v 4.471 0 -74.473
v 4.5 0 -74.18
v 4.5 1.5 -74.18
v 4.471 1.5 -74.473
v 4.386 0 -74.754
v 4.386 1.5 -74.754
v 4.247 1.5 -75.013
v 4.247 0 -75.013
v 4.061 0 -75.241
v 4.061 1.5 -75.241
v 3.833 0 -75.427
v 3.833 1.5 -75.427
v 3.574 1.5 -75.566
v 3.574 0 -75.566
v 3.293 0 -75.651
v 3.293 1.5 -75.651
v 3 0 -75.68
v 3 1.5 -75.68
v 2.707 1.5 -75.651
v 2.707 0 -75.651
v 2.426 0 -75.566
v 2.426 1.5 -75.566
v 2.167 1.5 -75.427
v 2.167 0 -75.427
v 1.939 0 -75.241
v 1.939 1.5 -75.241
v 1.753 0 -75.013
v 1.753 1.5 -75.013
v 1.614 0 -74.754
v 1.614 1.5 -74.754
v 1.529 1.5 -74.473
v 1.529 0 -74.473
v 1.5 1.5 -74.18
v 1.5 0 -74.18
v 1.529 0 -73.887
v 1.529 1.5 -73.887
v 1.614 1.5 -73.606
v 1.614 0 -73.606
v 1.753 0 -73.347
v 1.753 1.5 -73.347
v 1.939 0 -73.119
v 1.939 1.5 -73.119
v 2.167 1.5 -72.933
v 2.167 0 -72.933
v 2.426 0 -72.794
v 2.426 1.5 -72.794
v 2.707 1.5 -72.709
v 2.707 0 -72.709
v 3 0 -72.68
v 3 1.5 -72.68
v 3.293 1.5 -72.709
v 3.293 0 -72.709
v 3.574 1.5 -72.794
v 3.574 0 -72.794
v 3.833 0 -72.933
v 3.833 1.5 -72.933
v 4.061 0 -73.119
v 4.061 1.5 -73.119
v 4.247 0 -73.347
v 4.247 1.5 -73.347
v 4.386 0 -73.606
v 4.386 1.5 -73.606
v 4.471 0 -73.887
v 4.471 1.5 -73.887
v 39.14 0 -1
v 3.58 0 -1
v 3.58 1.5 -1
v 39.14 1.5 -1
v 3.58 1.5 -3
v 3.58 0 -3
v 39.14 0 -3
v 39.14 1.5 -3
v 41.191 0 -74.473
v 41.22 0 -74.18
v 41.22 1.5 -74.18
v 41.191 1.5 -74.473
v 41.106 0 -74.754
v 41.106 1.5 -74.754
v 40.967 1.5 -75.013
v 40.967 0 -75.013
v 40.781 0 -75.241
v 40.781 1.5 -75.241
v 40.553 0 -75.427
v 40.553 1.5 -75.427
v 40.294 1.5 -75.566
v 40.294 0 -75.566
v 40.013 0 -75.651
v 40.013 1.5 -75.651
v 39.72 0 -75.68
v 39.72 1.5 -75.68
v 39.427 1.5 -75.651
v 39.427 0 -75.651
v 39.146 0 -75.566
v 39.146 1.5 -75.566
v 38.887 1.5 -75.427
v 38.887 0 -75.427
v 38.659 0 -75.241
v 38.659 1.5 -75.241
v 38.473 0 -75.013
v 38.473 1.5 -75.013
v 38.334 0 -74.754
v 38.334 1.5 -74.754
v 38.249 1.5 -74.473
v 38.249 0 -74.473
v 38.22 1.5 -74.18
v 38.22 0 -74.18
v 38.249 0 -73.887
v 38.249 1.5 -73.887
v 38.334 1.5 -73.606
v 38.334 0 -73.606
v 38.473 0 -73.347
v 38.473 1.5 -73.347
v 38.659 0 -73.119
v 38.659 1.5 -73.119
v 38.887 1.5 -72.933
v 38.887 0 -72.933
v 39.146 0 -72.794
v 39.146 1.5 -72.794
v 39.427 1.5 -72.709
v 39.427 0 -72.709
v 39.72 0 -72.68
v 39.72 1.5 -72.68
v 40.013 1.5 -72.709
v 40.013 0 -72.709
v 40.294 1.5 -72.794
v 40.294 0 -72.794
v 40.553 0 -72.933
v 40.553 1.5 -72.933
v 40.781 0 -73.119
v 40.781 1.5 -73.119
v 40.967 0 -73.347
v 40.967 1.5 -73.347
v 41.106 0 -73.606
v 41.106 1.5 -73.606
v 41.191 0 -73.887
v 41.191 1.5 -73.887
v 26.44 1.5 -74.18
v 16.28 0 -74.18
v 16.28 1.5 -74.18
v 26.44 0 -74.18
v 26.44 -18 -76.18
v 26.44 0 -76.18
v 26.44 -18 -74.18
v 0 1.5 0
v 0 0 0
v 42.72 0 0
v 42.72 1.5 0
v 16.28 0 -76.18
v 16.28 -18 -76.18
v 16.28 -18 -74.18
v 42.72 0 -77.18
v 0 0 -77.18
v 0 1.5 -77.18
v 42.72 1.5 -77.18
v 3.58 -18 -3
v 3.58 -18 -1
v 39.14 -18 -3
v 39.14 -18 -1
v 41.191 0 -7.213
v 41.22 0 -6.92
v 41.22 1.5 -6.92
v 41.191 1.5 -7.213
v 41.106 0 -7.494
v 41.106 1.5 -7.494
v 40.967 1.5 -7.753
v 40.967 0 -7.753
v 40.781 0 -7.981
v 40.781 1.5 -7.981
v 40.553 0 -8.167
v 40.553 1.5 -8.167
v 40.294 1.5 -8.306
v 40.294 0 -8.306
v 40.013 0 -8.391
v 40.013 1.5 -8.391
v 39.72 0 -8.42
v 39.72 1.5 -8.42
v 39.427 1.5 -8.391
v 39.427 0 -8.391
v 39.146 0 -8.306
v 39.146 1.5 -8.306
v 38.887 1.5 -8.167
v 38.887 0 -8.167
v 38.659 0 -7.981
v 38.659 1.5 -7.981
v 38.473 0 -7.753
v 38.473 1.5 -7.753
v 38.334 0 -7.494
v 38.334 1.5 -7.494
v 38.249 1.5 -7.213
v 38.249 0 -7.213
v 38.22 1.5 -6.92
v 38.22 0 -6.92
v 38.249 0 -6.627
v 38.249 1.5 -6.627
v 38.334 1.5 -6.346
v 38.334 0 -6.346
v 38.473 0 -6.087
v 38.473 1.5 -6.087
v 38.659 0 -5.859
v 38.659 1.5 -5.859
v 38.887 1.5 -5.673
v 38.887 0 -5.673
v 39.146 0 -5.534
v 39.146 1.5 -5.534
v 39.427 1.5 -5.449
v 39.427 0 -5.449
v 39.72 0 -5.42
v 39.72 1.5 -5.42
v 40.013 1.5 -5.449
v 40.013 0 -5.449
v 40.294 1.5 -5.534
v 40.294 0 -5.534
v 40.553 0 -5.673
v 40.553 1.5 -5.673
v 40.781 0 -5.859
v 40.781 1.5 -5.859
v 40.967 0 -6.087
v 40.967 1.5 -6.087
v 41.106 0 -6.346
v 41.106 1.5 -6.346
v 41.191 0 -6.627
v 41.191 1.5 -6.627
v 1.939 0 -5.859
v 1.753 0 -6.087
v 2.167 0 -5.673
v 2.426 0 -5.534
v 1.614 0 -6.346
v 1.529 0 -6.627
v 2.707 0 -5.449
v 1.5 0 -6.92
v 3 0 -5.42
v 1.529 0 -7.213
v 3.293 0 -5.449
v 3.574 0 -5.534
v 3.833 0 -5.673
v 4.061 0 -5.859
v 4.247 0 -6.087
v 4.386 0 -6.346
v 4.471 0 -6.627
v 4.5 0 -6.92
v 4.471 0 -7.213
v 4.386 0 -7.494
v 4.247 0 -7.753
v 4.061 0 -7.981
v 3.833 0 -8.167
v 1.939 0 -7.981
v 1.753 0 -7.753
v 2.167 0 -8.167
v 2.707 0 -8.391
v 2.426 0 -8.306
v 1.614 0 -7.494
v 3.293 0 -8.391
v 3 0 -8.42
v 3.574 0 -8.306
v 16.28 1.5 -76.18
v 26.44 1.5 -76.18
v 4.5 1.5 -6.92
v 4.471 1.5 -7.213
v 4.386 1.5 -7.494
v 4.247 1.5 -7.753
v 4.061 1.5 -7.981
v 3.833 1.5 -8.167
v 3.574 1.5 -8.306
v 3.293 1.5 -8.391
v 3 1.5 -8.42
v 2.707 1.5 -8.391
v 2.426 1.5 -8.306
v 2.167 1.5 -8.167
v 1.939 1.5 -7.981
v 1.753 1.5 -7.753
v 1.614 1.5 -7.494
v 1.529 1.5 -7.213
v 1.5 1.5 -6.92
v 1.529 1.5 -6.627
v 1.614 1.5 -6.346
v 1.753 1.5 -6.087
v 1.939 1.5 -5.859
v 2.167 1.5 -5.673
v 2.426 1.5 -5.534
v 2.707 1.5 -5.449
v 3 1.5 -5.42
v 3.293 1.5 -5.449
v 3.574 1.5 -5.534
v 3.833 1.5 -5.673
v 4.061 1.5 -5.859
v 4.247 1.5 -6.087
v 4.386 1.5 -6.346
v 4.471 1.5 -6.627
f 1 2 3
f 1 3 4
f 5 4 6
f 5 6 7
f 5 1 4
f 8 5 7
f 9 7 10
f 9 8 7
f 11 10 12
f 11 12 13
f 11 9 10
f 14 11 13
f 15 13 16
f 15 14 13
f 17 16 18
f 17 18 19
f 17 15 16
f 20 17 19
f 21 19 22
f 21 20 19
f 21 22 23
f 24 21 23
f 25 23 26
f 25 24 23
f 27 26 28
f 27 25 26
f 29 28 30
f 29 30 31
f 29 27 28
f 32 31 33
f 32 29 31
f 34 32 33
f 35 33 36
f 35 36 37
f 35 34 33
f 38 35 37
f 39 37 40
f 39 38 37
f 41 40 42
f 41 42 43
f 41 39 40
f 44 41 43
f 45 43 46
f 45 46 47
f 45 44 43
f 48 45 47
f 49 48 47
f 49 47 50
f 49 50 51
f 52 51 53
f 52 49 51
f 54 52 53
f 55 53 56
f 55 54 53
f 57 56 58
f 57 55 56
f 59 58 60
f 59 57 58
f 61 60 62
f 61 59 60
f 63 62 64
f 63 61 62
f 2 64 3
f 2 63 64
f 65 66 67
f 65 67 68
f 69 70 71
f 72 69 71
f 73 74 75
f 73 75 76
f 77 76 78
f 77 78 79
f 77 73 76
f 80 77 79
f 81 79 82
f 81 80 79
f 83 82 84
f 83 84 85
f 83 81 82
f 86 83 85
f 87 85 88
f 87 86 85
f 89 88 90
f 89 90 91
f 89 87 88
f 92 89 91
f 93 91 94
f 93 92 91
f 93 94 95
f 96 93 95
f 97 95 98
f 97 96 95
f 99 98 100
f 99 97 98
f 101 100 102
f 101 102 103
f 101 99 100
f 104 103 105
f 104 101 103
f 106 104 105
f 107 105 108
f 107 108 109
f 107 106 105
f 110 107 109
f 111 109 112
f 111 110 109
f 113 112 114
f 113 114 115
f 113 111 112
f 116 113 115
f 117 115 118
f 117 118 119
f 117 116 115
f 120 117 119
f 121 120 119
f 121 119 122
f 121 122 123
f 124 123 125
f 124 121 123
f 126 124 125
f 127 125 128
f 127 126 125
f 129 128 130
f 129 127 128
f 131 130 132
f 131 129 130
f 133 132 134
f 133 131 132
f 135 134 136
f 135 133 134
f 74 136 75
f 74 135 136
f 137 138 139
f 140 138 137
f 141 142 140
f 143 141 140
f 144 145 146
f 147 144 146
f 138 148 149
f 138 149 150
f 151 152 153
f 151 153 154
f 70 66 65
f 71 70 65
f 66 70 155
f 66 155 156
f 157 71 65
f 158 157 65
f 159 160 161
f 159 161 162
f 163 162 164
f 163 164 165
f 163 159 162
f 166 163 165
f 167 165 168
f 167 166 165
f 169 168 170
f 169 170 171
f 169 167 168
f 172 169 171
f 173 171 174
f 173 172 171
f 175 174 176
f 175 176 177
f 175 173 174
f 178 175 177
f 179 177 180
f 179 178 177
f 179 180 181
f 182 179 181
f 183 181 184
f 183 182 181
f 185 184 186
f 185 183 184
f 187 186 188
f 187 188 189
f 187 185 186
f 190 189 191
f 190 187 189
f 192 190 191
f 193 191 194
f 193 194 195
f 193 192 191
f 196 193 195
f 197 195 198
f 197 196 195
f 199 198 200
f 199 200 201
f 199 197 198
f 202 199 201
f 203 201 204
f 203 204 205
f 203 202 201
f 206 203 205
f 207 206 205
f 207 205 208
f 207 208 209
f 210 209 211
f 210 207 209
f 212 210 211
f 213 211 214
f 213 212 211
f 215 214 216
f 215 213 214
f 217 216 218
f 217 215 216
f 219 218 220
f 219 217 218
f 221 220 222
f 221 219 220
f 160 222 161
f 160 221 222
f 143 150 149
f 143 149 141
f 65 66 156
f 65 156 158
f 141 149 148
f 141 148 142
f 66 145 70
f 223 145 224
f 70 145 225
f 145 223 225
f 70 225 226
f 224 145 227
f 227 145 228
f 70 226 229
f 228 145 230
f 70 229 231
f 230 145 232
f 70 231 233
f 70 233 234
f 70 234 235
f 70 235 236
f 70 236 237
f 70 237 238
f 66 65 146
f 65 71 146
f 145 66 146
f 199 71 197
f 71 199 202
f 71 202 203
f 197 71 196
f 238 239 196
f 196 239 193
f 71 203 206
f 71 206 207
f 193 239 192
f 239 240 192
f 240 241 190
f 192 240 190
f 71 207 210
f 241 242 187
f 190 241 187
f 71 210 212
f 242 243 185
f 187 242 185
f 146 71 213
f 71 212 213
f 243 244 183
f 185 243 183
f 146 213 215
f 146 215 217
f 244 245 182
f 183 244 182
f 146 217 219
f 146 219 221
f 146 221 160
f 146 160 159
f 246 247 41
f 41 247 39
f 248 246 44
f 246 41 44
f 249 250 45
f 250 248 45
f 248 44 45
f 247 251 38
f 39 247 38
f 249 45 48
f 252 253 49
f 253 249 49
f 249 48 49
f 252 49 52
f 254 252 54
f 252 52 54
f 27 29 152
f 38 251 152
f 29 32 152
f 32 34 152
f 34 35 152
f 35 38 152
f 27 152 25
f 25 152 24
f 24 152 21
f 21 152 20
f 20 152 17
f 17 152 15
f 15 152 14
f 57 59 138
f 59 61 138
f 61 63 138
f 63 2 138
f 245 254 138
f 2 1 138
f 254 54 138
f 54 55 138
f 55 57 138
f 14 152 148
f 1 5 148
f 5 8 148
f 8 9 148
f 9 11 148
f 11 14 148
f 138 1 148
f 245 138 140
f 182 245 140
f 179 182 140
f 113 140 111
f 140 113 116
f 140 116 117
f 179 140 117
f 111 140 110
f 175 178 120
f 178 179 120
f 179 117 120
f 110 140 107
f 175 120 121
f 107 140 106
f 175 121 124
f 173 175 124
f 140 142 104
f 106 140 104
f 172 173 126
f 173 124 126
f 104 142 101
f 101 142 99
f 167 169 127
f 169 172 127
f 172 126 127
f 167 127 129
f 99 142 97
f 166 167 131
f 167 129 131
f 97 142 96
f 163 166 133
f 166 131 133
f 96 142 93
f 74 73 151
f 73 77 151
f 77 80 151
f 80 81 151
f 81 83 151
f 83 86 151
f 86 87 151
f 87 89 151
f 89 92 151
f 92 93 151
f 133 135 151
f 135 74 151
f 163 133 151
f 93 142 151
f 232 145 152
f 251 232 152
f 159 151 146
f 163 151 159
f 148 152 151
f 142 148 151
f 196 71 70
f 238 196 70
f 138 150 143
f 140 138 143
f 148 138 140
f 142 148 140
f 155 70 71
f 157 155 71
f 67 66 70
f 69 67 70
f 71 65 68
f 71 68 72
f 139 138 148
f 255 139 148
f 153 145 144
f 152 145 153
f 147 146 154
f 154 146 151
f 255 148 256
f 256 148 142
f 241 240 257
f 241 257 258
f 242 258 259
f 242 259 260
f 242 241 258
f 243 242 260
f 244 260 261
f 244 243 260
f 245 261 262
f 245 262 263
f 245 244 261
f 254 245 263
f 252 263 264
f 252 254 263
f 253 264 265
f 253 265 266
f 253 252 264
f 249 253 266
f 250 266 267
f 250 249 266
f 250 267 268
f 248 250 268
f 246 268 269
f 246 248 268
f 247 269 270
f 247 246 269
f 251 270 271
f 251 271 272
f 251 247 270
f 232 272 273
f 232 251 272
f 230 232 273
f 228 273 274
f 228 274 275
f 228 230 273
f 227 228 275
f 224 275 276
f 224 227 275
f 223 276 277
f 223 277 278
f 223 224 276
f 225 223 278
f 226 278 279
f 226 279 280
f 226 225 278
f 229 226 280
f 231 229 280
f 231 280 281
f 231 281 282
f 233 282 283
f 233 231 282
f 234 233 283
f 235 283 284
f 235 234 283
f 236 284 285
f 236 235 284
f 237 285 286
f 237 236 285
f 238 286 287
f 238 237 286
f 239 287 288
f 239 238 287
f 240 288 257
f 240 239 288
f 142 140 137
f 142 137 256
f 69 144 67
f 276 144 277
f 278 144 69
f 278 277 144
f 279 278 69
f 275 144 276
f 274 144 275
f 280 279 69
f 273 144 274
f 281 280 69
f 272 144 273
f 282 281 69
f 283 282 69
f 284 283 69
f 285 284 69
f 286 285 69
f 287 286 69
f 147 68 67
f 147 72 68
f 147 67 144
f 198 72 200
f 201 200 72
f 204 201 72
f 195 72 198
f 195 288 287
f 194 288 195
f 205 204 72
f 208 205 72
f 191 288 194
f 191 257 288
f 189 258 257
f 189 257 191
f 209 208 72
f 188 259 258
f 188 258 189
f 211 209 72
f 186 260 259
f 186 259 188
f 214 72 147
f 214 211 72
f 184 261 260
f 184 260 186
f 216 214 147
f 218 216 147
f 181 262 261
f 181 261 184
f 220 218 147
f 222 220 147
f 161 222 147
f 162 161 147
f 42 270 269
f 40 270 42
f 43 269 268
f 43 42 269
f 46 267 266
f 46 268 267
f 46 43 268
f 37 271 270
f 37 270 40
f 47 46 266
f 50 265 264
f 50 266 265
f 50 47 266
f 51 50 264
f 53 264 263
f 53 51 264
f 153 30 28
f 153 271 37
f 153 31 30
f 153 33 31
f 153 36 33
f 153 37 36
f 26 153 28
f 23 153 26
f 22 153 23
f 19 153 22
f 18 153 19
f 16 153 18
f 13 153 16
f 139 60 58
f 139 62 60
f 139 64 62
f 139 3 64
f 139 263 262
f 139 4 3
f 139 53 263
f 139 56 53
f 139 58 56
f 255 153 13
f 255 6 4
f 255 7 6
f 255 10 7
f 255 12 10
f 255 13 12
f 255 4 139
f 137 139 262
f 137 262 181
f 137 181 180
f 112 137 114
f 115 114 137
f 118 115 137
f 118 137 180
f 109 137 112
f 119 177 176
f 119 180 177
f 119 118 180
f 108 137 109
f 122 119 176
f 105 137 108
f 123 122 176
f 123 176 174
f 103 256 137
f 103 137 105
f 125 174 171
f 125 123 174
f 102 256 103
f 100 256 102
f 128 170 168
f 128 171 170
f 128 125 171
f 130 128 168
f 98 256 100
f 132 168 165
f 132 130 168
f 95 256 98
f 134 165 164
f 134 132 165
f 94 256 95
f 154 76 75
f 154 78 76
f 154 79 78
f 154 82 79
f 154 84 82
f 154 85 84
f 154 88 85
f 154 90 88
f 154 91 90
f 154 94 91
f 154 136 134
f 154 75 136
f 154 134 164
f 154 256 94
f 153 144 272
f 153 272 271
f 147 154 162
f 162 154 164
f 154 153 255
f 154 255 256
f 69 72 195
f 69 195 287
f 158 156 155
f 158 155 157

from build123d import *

# Parameters (mm, degrees)
SKETCH1_W           = 42.72
SKETCH1_H           = 77.18
SKETCH1_R           = 1.5
SKETCH1_W_2         = 35.56
SKETCH1_H_2         = 2
SKETCH1_W_3         = 10.16
BOSS_EXTRUDE1_DEPTH = 1.5
SKETCH2_W           = 35.56
SKETCH2_H           = 2
BOSS_EXTRUDE2_DEPTH = 18
SKETCH3_W           = 10.16
SKETCH3_H           = 2
BOSS_EXTRUDE3_DEPTH = 18


with BuildPart() as part:
    # Sketch1 → Boss-Extrude1 (new body)
    with BuildSketch(Plane(origin=(0, 0, 0), x_dir=(1, 0, 0), z_dir=(0, 1, 0))):
        with Locations((21.36, 38.59)):
            Rectangle(SKETCH1_W, SKETCH1_H)
        with Locations((39.72, 74.18)):
            Circle(SKETCH1_R, mode=Mode.SUBTRACT)
        with Locations((3, 74.18)):
            Circle(SKETCH1_R, mode=Mode.SUBTRACT)
        with Locations((3, 6.92)):
            Circle(SKETCH1_R, mode=Mode.SUBTRACT)
        with Locations((39.72, 6.92)):
            Circle(SKETCH1_R, mode=Mode.SUBTRACT)
        with Locations((21.36, 2)):
            Rectangle(SKETCH1_W_2, SKETCH1_H_2, mode=Mode.SUBTRACT)
        with Locations((21.36, 75.18)):
            Rectangle(SKETCH1_W_3, SKETCH1_H_2, mode=Mode.SUBTRACT)
    extrude(amount=BOSS_EXTRUDE1_DEPTH)


with BuildPart() as body_2:
    # Sketch2 → Boss-Extrude2 (new body)
    with BuildSketch(Plane.XZ):
        with Locations((21.36, -2)):
            Rectangle(SKETCH2_W, SKETCH2_H)
    extrude(amount=BOSS_EXTRUDE2_DEPTH)


with BuildPart() as body_3:
    # Sketch3 → Boss-Extrude3 (new body)
    with BuildSketch(Plane.XZ):
        with Locations((21.36, -75.18)):
            Rectangle(SKETCH3_W, SKETCH3_H)
    extrude(amount=BOSS_EXTRUDE3_DEPTH)


solid = Compound([part.part, body_2.part, body_3.part])
